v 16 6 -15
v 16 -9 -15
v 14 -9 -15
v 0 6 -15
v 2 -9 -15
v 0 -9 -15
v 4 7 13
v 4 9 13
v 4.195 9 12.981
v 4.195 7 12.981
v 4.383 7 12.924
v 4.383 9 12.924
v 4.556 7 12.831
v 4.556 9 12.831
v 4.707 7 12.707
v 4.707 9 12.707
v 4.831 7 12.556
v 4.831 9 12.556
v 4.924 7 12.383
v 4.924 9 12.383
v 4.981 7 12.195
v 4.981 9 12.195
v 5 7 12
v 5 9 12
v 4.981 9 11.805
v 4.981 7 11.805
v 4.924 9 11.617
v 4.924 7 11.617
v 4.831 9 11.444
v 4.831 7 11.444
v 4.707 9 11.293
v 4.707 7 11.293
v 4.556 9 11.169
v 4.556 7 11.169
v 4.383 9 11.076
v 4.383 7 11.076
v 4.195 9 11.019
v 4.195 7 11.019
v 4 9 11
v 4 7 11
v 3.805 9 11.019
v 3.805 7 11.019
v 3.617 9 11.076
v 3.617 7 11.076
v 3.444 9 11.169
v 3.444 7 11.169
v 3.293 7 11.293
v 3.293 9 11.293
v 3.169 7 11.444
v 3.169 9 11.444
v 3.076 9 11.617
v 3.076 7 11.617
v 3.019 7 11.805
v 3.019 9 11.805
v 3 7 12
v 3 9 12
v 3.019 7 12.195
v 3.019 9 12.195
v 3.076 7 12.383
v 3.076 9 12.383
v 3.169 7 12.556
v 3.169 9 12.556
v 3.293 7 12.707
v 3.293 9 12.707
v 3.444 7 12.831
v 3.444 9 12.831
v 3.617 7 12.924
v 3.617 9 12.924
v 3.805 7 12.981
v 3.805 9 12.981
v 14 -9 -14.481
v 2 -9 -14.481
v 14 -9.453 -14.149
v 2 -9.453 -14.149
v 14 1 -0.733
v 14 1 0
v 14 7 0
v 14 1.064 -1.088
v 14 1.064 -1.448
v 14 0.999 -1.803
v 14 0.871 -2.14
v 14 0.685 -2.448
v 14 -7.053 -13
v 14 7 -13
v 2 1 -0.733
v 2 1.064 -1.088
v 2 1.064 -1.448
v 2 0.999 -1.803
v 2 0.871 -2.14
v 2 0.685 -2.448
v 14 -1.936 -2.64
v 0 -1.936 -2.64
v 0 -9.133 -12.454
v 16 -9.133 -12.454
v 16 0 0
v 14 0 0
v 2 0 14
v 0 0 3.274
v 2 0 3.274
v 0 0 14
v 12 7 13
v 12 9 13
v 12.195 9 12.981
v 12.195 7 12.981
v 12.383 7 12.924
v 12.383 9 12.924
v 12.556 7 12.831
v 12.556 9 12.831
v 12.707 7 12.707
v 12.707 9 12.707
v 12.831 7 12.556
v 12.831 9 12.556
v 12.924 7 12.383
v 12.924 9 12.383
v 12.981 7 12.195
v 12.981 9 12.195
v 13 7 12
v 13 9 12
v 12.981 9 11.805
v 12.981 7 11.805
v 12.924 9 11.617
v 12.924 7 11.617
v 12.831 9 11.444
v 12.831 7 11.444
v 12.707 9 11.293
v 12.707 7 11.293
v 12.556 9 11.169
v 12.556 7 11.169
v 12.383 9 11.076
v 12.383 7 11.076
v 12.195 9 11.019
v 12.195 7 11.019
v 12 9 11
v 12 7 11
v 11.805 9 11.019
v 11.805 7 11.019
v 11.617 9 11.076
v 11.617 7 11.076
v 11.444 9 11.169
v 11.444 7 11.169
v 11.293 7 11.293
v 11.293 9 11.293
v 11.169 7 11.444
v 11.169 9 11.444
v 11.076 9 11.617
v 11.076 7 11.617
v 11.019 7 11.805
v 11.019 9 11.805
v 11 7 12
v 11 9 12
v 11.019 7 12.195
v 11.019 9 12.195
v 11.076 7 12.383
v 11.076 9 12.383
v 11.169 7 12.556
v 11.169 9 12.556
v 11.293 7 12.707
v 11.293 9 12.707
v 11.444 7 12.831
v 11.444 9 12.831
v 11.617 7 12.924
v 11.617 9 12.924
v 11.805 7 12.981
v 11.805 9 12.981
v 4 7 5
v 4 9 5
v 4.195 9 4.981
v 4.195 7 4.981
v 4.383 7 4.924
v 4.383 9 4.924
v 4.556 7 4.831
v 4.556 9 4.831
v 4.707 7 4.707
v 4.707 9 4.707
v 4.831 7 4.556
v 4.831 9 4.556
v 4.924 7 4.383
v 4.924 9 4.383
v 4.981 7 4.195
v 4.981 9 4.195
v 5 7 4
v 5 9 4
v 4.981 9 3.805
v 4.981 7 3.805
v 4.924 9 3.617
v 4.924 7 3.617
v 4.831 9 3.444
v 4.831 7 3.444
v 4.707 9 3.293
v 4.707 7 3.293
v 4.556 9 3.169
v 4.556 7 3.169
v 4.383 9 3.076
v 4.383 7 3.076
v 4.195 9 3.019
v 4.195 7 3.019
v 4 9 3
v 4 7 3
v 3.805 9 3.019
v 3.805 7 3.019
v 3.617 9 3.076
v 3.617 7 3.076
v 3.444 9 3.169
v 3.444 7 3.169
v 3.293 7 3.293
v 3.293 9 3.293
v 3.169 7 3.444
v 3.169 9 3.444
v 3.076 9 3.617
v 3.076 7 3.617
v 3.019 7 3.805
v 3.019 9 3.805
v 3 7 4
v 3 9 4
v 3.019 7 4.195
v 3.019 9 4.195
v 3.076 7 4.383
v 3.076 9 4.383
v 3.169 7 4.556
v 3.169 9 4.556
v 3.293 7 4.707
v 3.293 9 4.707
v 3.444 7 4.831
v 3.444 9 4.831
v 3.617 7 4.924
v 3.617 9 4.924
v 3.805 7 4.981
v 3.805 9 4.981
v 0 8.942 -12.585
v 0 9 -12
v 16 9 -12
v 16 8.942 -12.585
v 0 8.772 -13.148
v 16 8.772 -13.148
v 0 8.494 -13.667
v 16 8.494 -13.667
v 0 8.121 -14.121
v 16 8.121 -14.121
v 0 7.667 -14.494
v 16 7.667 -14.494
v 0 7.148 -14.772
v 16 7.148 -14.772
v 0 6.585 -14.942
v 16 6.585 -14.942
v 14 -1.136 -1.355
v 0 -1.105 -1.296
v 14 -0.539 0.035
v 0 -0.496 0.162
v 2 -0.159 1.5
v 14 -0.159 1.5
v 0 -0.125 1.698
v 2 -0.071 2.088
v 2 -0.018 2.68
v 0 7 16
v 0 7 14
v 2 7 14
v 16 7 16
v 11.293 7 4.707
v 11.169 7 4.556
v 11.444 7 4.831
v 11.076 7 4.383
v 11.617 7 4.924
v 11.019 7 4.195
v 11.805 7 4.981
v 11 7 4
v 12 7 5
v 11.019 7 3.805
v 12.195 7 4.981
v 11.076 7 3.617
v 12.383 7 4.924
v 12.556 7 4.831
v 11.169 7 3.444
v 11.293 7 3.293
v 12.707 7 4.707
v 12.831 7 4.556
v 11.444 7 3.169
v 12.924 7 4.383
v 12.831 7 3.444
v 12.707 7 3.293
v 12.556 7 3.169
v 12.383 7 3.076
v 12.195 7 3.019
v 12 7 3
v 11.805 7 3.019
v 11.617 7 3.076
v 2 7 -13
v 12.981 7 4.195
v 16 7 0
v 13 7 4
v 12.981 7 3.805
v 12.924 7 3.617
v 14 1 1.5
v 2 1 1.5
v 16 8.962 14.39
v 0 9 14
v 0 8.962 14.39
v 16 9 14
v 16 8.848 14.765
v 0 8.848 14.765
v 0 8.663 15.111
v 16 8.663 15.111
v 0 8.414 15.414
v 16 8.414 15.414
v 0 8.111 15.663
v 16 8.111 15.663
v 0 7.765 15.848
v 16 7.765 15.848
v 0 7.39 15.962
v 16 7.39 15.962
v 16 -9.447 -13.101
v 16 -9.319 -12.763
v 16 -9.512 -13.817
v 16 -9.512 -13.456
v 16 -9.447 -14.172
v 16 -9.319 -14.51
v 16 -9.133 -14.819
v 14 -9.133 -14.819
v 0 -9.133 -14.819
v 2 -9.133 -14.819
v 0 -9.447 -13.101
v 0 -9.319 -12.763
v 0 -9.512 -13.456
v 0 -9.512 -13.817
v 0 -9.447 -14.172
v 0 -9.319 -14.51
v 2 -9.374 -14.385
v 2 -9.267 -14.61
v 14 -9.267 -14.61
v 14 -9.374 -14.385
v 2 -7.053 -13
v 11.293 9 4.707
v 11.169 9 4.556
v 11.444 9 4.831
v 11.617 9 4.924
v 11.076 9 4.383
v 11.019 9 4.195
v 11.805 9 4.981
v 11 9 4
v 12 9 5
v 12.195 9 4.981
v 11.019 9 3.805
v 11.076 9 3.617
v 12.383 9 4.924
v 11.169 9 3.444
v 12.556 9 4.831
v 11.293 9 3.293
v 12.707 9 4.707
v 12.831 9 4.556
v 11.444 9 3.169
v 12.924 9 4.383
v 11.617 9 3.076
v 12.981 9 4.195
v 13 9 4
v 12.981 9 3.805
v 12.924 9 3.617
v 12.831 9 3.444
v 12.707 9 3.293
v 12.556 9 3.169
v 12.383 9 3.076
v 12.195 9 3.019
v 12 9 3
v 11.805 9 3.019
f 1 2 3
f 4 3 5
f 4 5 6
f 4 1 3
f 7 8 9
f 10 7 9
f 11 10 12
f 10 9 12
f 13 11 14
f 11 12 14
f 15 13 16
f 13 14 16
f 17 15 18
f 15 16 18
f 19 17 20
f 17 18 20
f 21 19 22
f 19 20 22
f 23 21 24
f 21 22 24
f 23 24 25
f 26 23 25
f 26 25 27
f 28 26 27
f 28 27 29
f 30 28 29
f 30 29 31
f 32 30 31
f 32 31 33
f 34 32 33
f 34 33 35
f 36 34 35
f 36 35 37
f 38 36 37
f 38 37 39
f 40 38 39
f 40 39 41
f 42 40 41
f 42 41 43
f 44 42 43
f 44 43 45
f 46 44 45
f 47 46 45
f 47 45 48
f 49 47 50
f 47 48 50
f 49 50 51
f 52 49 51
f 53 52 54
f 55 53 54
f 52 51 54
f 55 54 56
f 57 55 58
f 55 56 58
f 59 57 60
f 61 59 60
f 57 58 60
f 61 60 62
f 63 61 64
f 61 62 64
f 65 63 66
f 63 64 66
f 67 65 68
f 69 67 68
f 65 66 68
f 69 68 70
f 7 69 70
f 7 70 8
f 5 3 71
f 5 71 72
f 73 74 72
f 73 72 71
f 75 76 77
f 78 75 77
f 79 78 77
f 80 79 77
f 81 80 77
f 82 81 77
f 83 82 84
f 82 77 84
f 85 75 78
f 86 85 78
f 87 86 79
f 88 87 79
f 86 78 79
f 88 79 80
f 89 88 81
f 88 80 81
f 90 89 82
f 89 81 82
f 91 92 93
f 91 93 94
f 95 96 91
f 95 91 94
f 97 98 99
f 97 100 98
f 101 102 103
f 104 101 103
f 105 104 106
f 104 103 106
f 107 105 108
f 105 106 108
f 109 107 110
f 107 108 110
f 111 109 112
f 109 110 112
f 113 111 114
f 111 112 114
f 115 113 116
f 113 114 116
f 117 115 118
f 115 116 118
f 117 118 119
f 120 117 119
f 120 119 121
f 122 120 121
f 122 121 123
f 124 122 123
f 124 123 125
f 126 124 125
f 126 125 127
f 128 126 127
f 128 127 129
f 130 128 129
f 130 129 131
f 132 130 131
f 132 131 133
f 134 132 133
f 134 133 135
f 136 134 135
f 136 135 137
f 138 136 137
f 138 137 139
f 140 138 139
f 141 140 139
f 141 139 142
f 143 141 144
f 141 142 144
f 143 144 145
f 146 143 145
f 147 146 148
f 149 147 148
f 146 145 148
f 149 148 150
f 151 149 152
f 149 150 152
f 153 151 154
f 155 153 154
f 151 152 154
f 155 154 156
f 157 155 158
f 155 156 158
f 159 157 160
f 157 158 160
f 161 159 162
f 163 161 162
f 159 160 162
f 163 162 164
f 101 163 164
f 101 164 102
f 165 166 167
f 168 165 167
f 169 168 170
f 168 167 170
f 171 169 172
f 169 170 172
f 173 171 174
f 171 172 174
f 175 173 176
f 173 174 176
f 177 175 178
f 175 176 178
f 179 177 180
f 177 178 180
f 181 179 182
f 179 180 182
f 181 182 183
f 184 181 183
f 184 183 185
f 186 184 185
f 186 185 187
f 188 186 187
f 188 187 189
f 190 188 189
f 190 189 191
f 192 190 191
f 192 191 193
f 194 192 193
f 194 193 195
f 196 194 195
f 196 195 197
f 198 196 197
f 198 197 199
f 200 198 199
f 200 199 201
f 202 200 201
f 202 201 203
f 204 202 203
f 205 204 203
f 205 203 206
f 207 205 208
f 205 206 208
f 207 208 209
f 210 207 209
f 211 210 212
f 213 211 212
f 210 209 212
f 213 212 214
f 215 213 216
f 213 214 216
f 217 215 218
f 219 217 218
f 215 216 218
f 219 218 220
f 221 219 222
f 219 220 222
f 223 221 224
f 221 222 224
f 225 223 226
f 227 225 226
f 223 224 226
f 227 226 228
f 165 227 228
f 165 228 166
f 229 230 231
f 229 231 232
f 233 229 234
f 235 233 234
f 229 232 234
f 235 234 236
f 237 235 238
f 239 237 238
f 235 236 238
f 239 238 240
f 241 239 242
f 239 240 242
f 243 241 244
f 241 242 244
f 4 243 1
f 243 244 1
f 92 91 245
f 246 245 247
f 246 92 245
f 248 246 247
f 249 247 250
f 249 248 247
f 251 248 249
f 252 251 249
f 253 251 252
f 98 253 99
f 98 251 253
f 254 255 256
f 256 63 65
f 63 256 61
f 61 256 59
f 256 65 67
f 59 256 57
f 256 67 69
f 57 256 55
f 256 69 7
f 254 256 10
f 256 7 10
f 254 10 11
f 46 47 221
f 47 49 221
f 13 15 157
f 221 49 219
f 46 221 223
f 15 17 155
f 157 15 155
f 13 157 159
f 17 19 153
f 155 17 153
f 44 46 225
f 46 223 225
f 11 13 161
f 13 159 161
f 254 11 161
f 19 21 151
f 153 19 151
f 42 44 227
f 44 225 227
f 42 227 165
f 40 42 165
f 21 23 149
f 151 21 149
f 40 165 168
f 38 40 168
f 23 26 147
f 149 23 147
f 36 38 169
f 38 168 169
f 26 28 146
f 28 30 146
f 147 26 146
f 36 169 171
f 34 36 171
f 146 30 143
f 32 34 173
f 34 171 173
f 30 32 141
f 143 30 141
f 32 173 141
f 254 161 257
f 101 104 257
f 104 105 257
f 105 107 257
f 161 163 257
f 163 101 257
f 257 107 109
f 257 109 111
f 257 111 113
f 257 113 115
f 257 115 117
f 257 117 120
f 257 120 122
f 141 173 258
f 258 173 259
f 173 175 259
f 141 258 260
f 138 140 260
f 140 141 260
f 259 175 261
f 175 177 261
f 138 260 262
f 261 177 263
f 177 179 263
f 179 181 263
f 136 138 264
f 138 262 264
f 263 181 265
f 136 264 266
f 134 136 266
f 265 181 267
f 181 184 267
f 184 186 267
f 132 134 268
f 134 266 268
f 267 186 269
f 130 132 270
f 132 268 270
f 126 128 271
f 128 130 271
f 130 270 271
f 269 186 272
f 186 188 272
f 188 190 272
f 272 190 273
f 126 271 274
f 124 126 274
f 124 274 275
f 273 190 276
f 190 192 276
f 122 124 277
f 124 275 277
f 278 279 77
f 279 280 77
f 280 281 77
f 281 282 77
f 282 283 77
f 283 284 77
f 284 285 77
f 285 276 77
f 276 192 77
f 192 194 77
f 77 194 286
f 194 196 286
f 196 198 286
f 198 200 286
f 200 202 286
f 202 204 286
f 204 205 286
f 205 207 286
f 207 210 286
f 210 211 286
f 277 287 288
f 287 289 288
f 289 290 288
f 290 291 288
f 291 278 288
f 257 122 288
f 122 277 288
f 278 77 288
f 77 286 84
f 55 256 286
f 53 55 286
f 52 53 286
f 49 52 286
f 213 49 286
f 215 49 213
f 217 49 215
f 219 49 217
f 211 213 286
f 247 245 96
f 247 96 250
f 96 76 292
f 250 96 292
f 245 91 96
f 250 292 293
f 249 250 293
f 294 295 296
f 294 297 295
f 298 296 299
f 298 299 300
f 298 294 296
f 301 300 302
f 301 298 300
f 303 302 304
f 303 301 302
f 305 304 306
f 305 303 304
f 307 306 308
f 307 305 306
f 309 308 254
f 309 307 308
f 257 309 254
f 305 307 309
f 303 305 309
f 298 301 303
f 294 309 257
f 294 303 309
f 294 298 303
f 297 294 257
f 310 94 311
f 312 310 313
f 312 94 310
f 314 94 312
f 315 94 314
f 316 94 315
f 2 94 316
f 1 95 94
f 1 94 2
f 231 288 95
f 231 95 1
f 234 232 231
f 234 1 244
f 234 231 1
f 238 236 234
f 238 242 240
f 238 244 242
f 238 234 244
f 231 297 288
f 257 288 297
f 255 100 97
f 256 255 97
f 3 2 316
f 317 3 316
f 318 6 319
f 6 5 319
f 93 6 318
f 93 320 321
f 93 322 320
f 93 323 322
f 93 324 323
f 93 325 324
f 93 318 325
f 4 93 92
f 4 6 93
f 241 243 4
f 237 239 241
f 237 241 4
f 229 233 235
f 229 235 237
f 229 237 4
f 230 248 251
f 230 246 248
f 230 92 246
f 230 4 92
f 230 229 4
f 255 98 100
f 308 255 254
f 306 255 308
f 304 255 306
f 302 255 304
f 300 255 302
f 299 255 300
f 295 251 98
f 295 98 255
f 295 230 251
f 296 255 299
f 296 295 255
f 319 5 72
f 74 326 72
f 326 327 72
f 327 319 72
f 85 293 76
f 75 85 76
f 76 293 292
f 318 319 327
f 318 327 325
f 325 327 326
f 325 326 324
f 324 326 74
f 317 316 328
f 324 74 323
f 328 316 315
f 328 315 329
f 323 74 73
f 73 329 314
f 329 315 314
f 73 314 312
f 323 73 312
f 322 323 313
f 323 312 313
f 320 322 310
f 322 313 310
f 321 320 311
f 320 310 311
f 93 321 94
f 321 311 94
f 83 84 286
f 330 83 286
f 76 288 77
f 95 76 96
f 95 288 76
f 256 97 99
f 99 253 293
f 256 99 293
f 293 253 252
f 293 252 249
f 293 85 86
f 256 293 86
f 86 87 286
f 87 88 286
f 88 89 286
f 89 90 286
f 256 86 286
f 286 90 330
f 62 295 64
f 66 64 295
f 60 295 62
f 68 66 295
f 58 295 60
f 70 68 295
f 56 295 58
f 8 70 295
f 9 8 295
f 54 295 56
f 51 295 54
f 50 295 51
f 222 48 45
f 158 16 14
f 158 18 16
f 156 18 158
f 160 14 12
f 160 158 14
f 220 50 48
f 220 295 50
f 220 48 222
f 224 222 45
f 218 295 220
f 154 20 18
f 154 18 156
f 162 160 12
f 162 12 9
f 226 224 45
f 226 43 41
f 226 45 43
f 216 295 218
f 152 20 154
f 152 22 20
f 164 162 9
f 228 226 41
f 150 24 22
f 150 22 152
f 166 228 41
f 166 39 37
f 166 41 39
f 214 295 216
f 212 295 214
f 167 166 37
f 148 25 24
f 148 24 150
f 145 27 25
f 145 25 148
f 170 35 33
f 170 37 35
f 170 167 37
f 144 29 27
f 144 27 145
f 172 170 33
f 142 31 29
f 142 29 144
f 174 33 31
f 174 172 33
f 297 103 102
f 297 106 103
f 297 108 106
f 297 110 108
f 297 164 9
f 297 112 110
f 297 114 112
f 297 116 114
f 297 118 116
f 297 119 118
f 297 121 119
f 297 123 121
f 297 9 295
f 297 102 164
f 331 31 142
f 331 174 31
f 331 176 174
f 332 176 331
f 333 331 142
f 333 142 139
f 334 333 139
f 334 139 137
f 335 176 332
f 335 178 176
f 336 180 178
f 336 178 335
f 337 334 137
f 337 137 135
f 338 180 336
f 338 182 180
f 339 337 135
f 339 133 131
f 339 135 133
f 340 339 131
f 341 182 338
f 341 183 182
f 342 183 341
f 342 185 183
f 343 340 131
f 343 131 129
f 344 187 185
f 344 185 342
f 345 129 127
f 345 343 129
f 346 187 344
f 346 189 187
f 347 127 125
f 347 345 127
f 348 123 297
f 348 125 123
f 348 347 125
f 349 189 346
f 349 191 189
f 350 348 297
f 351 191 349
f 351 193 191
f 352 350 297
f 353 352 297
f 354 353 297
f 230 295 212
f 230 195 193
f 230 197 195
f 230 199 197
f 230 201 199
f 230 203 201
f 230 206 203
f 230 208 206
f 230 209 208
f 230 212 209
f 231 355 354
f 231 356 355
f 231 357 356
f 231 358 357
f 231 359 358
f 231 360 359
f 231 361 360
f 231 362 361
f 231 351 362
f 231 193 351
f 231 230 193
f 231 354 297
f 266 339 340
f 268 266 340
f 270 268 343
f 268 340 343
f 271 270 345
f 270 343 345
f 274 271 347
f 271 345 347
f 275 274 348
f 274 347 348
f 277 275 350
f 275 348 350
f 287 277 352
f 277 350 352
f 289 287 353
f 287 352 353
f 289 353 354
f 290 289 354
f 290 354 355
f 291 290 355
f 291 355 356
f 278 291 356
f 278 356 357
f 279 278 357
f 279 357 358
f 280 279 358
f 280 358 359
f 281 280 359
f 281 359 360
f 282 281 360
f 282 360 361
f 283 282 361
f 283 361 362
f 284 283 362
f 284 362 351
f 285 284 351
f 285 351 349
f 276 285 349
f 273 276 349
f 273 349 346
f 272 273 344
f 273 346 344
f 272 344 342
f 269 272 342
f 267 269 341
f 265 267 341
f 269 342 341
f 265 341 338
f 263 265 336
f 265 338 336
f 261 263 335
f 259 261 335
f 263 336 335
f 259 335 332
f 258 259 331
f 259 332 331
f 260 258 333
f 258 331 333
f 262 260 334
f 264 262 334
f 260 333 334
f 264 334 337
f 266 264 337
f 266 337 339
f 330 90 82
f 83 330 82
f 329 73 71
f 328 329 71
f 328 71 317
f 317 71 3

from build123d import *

# Parameters (mm, degrees)
SKETCH1_W           = 2
SKETCH1_H           = 14
BOSS_EXTRUDE1_DEPTH = 7
SKETCH2_W           = 16
SKETCH2_H           = 16
BOSS_EXTRUDE2_DEPTH = 2
BOSS_EXTRUDE3_DEPTH = 2
BOSS_EXTRUDE4_DEPTH = 2
SKETCH6_W           = 12
SKETCH6_H           = 15
BOSS_EXTRUDE5_DEPTH = 2
SKETCH7_W           = 12
SKETCH7_H           = 16
BOSS_EXTRUDE6_DEPTH = 2
SKETCH8_W           = 12
SKETCH8_H           = 17
BOSS_EXTRUDE7_DEPTH = 2
SKETCH9_W           = 12
SKETCH9_H           = 3.5
BOSS_EXTRUDE9_DEPTH = 1
FILLET1_R           = 3
FILLET2_R           = 10
FILLET3_R           = 2
CUT_EXTRUDE4_REACH  = 32.199
SKETCH14_R          = 1
FILLET4_R           = 2
CUT_EXTRUDE5_DEPTH  = 26.159491251
FILLET5_R           = 2


# Some blends are built 0.0001 mm under size
with BuildPart() as part:
    # Sketch1 → Boss-Extrude1 (new body)
    with BuildSketch(Plane(origin=(0, 0, 0), x_dir=(1, 0, 0), z_dir=(0, 1, 0))):
        with Locations((1, -7)):
            Rectangle(SKETCH1_W, SKETCH1_H)
    extrude(amount=BOSS_EXTRUDE1_DEPTH)

    # Sketch2 → Boss-Extrude2 (add)
    with BuildSketch(Plane(origin=(0, 7, 0), x_dir=(1, 0, 0), z_dir=(0, 1, 0))):
        with Locations((8, -8)):
            Rectangle(SKETCH2_W, SKETCH2_H)
    extrude(amount=BOSS_EXTRUDE2_DEPTH)

    # Sketch4 → Boss-Extrude3 (add)
    with BuildSketch(Plane(origin=(16, 0, 0), x_dir=(0, 0, -1), z_dir=(1, 0, 0))):
        Polygon((0, 0), (15, -11), (15, 9), (0, 9), align=None)
    extrude(amount=-BOSS_EXTRUDE3_DEPTH)

    # Sketch5 → Boss-Extrude4 (add)
    with BuildSketch(Plane.ZY):
        Polygon((0, 9), (-15, 9), (-15, -11), (0, 0), align=None)
    extrude(amount=-BOSS_EXTRUDE4_DEPTH)

    # Sketch6 → Boss-Extrude5 (add)
    with BuildSketch(Plane(origin=(0, 9, 0), x_dir=(1, 0, 0), z_dir=(0, 1, 0))):
        with Locations((8, 7.5)):
            Rectangle(SKETCH6_W, SKETCH6_H)
    extrude(amount=-BOSS_EXTRUDE5_DEPTH)

    # Sketch7 → Boss-Extrude6 (add)
    with BuildSketch(Plane(origin=(0, 0, -15), x_dir=(-1, 0, 0), z_dir=(0, 0, -1))):
        with Locations((-8, -1)):
            Rectangle(SKETCH7_W, SKETCH7_H)
    extrude(amount=-BOSS_EXTRUDE6_DEPTH)

    # Sketch8 → Boss-Extrude7 (add)
    with BuildSketch(Plane(origin=(0, 0, 0), x_dir=(1, 0, 0), z_dir=(0, -0.8064049958557057, 0.5913636636275174))):
        with Locations((8, -8.5)):
            Rectangle(SKETCH8_W, SKETCH8_H)
    extrude(amount=-BOSS_EXTRUDE7_DEPTH)

    # Sketch9 → Boss-Extrude9 (add)
    with BuildSketch(Plane.XZ):
        with Locations((8, -0.25)):
            Rectangle(SKETCH9_W, SKETCH9_H)
    extrude(amount=-BOSS_EXTRUDE9_DEPTH)

    # Fillet1
    fillet1_edges = [part.edges().sort_by_distance(p)[0] for p in [
        (8, 9, -15),
    ]]
    fillet(fillet1_edges, radius=FILLET1_R)

    # Fillet2
    # the kernel refuses this fillet: 10 mm, written as the material it adds along each edge
    with BuildSketch(Plane(origin=(0, 0, 0), x_dir=(0, -0.5913636636275174, -0.8064049958557056), z_dir=(1, 0, 0))) as fillet2_piece_1_section:
        with BuildLine():
            CenterArc((FILLET2_R * 0.327370476158, -FILLET2_R), FILLET2_R, 90, 36.253837737)
            Line((-FILLET2_R * 0.263993187469, -FILLET2_R * 0.193595004144), (0, 0))
            Line((0, 0), (FILLET2_R * 0.327370476158, 0))
        make_face()
    fillet2_piece_1 = extrude(amount=14, mode=Mode.PRIVATE)
    fillet2_piece_1 = split(fillet2_piece_1, bisect_by=Plane(origin=(1, -0.664008542, 1.5), z_dir=(0, 0, -1)), keep=Keep.TOP, mode=Mode.PRIVATE)
    add(fillet2_piece_1)
    with BuildSketch(Plane(origin=(0, 0, 0), x_dir=(0, -0.5913636636275174, -0.8064049958557056), z_dir=(1, 0, 0))) as fillet2_piece_2_section:
        with BuildLine():
            CenterArc((FILLET2_R * 0.327370476158, -FILLET2_R), FILLET2_R, 90, 36.253837737)
            Line((-FILLET2_R * 0.263993187469, -FILLET2_R * 0.193595004144), (0, 0))
            Line((0, 0), (FILLET2_R * 0.327370476158, 0))
        make_face()
    fillet2_piece_2 = extrude(amount=22.184261904, mode=Mode.PRIVATE)
    fillet2_piece_2 = split(fillet2_piece_2, bisect_by=Plane(origin=(2, -0.047502187, 1.942720069), z_dir=(-1, 0, 0)), keep=Keep.TOP, mode=Mode.PRIVATE)
    add(fillet2_piece_2)

    # Fillet3
    fillet3_edges = [part.edges().sort_by_distance(p)[0] for p in [
        (8, 9, 16),
    ]]
    fillet(fillet3_edges, radius=FILLET3_R - 0.0001)  # a hair under: the kernel refuses the full size

    # Sketch14 → Cut-Extrude4 (cut, up to next)
    with BuildSketch(Plane(origin=(0, 9, 0), x_dir=(1, 0, 0), z_dir=(0, 1, 0)), mode=Mode.PRIVATE) as cut_extrude4_sk1:
        with Locations(Location((4, -12, 0), (0, 0, 270))):
            Circle(SKETCH14_R)
    cut_extrude4_tool1 = extrude(cut_extrude4_sk1.sketch, amount=-CUT_EXTRUDE4_REACH, mode=Mode.PRIVATE) & part.part
    # Sketch14 → Cut-Extrude4 (cut, up to next)
    with BuildSketch(Plane(origin=(0, 9, 0), x_dir=(1, 0, 0), z_dir=(0, 1, 0)), mode=Mode.PRIVATE) as cut_extrude4_sk2:
        with Locations(Location((4, -4, 0), (0, 0, 270))):
            Circle(SKETCH14_R)
    cut_extrude4_tool2 = extrude(cut_extrude4_sk2.sketch, amount=-CUT_EXTRUDE4_REACH, mode=Mode.PRIVATE) & part.part
    # Sketch14 → Cut-Extrude4 (cut, up to next)
    with BuildSketch(Plane(origin=(0, 9, 0), x_dir=(1, 0, 0), z_dir=(0, 1, 0)), mode=Mode.PRIVATE) as cut_extrude4_sk3:
        with Locations(Location((12, -12, 0), (0, 0, 270))):
            Circle(SKETCH14_R)
    cut_extrude4_tool3 = extrude(cut_extrude4_sk3.sketch, amount=-CUT_EXTRUDE4_REACH, mode=Mode.PRIVATE) & part.part
    # Sketch14 → Cut-Extrude4 (cut, up to next)
    with BuildSketch(Plane(origin=(0, 9, 0), x_dir=(1, 0, 0), z_dir=(0, 1, 0)), mode=Mode.PRIVATE) as cut_extrude4_sk4:
        with Locations(Location((12, -4, 0), (0, 0, 270))):
            Circle(SKETCH14_R)
    cut_extrude4_tool4 = extrude(cut_extrude4_sk4.sketch, amount=-CUT_EXTRUDE4_REACH, mode=Mode.PRIVATE) & part.part
    add(cut_extrude4_tool1.solids().sort_by_distance((4, 9, 12))[0], mode=Mode.SUBTRACT)
    add(cut_extrude4_tool2.solids().sort_by_distance((4, 9, 4))[0], mode=Mode.SUBTRACT)
    add(cut_extrude4_tool3.solids().sort_by_distance((12, 9, 12))[0], mode=Mode.SUBTRACT)
    add(cut_extrude4_tool4.solids().sort_by_distance((12, 9, 4))[0], mode=Mode.SUBTRACT)

    # Fillet4
    # the kernel refuses this fillet: 2 mm, written as the material it takes off along each edge
    with BuildSketch(Plane(origin=(14, 1.612809992, -1.182727327), x_dir=(0, -0.5913636636275179, -0.806404995855705), z_dir=(-1, 0, 0))) as fillet4_piece_1:
        with BuildLine():
            CenterArc((1.569146973, 2), FILLET4_R, 218.318751839, 51.681248161)
            Line((0, 0.759928317), (-0.031382939, 0.735126884))
            ThreePointArc((-0.031382939, 0.735126884), (-0.04, 0.379964159), (-0.04, 0))
            Line((-0.04, 0), (0, -0.04))
            Line((0, -0.04), (1.569146973, -0.04))
            Line((1.569146973, -0.04), (1.569146973, 0))
        make_face()
    extrude(amount=12, mode=Mode.SUBTRACT)

    # Sketch15 → Cut-Extrude5 (cut, through all)
    with BuildSketch(Plane(origin=(16, 0, 0), x_dir=(0, 0, -1), z_dir=(1, 0, 0))):
        Polygon((13.636363636, -10), (15, -11), (15, -9), align=None)
    extrude(amount=-CUT_EXTRUDE5_DEPTH, mode=Mode.SUBTRACT)

    # Fillet5
    # the kernel refuses this fillet: 2 mm, written as the material it takes off along each edge
    with BuildSketch(Plane(origin=(19.666666667, -10, -13.636363636), x_dir=(0, 0.5913636636275166, 0.806404995855706), z_dir=(-1, 0, 0))) as fillet5_piece_1:
        with BuildLine():
            CenterArc((FILLET5_R * 0.733333333333, FILLET5_R), FILLET5_R, 197.492324525, 72.507675475)
            Line((-FILLET5_R * 0.2204238921, FILLET5_R * 0.699421965318), (0, 0))
            Line((0, 0), (FILLET5_R * 0.733333333333, 0))
        make_face()
    extrude(amount=23.333333333, mode=Mode.SUBTRACT)


solid = part.part
